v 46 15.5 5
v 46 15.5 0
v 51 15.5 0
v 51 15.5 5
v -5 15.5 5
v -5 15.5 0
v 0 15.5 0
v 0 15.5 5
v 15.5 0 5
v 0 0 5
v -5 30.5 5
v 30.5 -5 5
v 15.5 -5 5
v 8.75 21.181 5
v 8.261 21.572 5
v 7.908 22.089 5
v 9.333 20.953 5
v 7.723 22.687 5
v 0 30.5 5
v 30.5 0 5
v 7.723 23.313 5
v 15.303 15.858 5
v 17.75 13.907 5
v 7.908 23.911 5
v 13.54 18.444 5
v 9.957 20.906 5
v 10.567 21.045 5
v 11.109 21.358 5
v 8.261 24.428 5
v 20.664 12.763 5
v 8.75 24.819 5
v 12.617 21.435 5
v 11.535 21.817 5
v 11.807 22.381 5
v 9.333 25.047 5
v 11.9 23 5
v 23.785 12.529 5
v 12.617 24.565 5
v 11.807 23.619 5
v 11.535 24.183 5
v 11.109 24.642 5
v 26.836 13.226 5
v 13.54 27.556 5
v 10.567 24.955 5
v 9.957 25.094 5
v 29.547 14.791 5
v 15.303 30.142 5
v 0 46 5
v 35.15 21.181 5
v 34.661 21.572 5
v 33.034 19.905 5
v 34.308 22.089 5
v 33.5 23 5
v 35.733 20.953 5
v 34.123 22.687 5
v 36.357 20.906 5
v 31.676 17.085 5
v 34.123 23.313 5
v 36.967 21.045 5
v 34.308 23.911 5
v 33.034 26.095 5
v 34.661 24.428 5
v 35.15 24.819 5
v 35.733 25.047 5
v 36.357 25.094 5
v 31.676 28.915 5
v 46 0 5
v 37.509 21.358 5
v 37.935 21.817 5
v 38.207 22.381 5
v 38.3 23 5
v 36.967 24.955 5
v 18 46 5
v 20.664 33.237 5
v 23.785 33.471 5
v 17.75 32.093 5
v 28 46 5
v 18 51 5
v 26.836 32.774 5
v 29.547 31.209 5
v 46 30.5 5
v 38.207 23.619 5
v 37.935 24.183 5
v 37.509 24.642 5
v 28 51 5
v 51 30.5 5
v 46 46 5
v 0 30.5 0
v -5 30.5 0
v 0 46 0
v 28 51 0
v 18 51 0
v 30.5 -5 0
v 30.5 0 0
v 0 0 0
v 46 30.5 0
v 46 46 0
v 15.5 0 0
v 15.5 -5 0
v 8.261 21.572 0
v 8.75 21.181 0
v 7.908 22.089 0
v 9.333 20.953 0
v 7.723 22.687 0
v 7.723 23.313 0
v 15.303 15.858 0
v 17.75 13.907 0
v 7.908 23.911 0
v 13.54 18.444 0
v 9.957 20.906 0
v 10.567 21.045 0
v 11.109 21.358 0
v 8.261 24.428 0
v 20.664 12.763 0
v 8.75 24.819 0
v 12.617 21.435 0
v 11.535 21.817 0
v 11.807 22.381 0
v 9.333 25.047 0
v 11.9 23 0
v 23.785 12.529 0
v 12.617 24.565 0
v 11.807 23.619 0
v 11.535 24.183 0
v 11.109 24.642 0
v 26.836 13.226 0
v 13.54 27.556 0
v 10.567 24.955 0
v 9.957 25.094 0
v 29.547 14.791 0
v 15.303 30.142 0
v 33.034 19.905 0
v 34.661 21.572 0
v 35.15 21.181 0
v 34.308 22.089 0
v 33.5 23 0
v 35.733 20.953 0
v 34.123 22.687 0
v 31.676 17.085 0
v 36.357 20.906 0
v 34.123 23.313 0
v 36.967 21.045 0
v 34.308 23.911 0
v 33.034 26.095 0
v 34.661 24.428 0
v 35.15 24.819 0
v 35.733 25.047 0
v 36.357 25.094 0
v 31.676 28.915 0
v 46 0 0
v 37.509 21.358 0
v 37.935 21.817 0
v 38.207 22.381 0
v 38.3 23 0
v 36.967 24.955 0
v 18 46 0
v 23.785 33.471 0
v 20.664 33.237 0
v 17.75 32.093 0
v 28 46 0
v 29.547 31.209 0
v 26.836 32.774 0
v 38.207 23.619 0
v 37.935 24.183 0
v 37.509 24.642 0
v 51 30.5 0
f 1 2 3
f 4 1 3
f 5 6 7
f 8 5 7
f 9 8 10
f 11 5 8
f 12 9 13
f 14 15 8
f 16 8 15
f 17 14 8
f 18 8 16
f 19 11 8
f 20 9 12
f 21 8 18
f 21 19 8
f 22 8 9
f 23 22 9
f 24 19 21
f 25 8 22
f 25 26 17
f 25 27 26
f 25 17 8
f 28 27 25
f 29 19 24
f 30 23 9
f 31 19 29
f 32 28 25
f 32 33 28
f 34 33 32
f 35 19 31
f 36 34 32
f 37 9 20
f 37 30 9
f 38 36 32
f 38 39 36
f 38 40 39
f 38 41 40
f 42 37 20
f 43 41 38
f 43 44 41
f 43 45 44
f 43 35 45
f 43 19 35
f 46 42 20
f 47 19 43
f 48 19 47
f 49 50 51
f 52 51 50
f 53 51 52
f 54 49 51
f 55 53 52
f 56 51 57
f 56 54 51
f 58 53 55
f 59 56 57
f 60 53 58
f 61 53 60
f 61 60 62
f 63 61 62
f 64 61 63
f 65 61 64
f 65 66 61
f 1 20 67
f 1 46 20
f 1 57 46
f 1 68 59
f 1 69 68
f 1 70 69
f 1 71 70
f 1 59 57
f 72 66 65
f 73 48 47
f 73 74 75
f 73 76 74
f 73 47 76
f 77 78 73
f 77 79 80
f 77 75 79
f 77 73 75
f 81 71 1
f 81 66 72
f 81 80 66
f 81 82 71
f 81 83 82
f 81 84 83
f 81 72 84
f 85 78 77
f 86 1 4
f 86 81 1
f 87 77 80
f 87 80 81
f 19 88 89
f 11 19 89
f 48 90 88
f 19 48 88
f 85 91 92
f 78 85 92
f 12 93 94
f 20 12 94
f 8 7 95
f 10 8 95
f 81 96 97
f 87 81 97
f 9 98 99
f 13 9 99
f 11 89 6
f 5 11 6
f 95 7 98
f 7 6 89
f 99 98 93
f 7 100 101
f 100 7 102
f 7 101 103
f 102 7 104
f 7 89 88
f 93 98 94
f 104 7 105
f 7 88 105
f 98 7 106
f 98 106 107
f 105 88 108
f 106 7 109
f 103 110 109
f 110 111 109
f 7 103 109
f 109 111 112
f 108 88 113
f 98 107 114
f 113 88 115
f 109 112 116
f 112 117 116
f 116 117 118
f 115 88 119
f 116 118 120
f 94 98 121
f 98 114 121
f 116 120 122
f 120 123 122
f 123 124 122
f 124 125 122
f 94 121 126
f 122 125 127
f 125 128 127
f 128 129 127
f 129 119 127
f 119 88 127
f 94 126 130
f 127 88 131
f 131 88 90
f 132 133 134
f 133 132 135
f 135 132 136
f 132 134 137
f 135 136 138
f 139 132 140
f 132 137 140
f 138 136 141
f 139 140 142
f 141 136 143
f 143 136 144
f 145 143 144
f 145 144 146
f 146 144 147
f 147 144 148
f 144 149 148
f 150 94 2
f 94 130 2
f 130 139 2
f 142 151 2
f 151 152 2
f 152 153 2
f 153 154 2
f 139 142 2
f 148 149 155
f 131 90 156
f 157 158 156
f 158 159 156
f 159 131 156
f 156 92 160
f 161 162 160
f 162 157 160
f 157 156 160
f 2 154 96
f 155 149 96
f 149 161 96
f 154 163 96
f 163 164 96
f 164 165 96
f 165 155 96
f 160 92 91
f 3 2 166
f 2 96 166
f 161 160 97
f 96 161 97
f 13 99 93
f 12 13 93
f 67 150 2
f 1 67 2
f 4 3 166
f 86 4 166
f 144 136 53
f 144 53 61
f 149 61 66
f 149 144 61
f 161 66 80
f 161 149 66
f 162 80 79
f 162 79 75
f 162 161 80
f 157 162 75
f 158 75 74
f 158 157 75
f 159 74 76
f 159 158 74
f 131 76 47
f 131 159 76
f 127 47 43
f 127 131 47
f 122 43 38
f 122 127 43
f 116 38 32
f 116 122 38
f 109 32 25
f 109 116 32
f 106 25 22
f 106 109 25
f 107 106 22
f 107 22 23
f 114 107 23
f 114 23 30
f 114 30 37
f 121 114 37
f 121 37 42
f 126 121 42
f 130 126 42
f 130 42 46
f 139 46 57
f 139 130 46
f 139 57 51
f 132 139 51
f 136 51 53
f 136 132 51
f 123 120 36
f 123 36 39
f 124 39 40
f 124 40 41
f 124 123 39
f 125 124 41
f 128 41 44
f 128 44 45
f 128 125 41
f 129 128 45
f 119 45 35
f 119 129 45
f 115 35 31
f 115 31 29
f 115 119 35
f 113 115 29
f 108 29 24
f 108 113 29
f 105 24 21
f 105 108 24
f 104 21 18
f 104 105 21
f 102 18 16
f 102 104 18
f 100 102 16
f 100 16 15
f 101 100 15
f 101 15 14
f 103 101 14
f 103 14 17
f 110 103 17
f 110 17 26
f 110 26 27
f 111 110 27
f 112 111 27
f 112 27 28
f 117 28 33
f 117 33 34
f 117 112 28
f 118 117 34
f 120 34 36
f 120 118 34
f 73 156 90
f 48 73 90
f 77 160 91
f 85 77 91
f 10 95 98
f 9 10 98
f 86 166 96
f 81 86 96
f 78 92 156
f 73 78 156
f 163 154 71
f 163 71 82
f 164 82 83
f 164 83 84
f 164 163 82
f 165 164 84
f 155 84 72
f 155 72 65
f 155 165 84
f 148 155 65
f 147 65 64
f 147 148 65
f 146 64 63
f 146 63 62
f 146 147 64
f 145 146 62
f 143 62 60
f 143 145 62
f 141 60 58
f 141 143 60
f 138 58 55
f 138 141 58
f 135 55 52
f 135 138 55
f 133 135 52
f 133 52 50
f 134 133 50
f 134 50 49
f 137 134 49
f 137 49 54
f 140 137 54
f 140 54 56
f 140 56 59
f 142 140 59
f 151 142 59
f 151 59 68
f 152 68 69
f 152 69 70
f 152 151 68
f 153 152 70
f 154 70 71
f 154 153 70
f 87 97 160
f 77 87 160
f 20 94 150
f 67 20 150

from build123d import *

# Parameters (mm, degrees)
F1_R     = 2.1
F1_R_2   = 10.5
F2_DEPTH = 5


with BuildPart() as f2:
    # F1 (on Top) → F2 (new body)
    with BuildSketch(Plane.XY):
        Polygon((0, 15.5), (0, 0), (15.5, 0), (15.5, -5), (30.5, -5), (30.5, 0), (46, 0), (46, 15.5), (51, 15.5), (51, 30.5), (46, 30.5), (46, 46), (28, 46), (28, 51), (18, 51), (18, 46), (0, 46), (0, 30.5), (-5, 30.5), (-5, 15.5), align=None)
        with Locations((9.8, 23)):
            Circle(F1_R, mode=Mode.SUBTRACT)
        with Locations((23, 23)):
            Circle(F1_R_2, mode=Mode.SUBTRACT)
        with Locations((36.2, 23)):
            Circle(F1_R, mode=Mode.SUBTRACT)
    extrude(amount=F2_DEPTH)


solid = f2.part
